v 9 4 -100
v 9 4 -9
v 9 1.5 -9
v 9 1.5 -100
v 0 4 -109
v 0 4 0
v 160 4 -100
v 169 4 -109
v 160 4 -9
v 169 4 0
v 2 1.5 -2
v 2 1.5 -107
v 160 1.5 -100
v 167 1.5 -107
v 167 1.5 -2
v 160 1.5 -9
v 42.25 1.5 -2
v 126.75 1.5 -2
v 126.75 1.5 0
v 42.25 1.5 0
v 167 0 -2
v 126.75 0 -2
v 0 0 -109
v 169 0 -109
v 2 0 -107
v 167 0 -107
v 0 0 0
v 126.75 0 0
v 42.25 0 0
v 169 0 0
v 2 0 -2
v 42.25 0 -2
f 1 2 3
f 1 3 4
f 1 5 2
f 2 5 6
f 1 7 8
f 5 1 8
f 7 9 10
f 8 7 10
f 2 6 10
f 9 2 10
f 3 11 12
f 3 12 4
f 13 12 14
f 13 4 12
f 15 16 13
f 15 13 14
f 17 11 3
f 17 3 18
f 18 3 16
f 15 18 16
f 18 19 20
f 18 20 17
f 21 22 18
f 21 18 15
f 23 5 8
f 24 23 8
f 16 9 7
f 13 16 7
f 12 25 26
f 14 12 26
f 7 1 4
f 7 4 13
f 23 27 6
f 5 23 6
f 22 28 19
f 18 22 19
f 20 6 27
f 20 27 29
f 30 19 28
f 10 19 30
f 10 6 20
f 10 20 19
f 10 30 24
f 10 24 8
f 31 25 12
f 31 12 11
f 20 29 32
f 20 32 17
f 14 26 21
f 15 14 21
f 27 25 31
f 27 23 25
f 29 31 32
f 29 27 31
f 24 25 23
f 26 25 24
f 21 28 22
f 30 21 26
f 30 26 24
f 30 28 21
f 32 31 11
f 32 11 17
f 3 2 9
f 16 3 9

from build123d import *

# Parameters (mm, degrees)
SKETCH1_W           = 169
SKETCH1_H           = 4
BOSS_EXTRUDE1_DEPTH = 109
SKETCH3_W           = 165
SKETCH3_H           = 105
CUT_EXTRUDE1_DEPTH  = 1.5
SKETCH4_W           = 151
SKETCH4_H           = 91
CUT_EXTRUDE2_DEPTH  = 5
SKETCH5_W           = 84.5
SKETCH5_H           = 1.5
CUT_EXTRUDE3_DEPTH  = 2


with BuildPart() as part:
    # Sketch1 → Boss-Extrude1 (new body)
    with BuildSketch(Plane.XY):
        with Locations((84.5, 2)):
            Rectangle(SKETCH1_W, SKETCH1_H)
    extrude(amount=-BOSS_EXTRUDE1_DEPTH)

    # Sketch3 → Cut-Extrude1 (cut)
    with BuildSketch(Plane.XZ):
        with Locations((84.5, -54.5)):
            Rectangle(SKETCH3_W, SKETCH3_H)
    extrude(amount=-CUT_EXTRUDE1_DEPTH, mode=Mode.SUBTRACT)

    # Sketch4 → Cut-Extrude2 (cut)
    with BuildSketch(Plane(origin=(0, 4, 0), x_dir=(1, 0, 0), z_dir=(0, 1, 0))):
        with Locations((84.5, 54.5)):
            Rectangle(SKETCH4_W, SKETCH4_H)
    extrude(amount=-CUT_EXTRUDE2_DEPTH, mode=Mode.SUBTRACT)

    # Sketch5 → Cut-Extrude3 (cut)
    with BuildSketch(Plane.XY):
        with Locations((84.5, 0.75)):
            Rectangle(SKETCH5_W, SKETCH5_H)
    extrude(amount=-CUT_EXTRUDE3_DEPTH, mode=Mode.SUBTRACT)


solid = part.part
